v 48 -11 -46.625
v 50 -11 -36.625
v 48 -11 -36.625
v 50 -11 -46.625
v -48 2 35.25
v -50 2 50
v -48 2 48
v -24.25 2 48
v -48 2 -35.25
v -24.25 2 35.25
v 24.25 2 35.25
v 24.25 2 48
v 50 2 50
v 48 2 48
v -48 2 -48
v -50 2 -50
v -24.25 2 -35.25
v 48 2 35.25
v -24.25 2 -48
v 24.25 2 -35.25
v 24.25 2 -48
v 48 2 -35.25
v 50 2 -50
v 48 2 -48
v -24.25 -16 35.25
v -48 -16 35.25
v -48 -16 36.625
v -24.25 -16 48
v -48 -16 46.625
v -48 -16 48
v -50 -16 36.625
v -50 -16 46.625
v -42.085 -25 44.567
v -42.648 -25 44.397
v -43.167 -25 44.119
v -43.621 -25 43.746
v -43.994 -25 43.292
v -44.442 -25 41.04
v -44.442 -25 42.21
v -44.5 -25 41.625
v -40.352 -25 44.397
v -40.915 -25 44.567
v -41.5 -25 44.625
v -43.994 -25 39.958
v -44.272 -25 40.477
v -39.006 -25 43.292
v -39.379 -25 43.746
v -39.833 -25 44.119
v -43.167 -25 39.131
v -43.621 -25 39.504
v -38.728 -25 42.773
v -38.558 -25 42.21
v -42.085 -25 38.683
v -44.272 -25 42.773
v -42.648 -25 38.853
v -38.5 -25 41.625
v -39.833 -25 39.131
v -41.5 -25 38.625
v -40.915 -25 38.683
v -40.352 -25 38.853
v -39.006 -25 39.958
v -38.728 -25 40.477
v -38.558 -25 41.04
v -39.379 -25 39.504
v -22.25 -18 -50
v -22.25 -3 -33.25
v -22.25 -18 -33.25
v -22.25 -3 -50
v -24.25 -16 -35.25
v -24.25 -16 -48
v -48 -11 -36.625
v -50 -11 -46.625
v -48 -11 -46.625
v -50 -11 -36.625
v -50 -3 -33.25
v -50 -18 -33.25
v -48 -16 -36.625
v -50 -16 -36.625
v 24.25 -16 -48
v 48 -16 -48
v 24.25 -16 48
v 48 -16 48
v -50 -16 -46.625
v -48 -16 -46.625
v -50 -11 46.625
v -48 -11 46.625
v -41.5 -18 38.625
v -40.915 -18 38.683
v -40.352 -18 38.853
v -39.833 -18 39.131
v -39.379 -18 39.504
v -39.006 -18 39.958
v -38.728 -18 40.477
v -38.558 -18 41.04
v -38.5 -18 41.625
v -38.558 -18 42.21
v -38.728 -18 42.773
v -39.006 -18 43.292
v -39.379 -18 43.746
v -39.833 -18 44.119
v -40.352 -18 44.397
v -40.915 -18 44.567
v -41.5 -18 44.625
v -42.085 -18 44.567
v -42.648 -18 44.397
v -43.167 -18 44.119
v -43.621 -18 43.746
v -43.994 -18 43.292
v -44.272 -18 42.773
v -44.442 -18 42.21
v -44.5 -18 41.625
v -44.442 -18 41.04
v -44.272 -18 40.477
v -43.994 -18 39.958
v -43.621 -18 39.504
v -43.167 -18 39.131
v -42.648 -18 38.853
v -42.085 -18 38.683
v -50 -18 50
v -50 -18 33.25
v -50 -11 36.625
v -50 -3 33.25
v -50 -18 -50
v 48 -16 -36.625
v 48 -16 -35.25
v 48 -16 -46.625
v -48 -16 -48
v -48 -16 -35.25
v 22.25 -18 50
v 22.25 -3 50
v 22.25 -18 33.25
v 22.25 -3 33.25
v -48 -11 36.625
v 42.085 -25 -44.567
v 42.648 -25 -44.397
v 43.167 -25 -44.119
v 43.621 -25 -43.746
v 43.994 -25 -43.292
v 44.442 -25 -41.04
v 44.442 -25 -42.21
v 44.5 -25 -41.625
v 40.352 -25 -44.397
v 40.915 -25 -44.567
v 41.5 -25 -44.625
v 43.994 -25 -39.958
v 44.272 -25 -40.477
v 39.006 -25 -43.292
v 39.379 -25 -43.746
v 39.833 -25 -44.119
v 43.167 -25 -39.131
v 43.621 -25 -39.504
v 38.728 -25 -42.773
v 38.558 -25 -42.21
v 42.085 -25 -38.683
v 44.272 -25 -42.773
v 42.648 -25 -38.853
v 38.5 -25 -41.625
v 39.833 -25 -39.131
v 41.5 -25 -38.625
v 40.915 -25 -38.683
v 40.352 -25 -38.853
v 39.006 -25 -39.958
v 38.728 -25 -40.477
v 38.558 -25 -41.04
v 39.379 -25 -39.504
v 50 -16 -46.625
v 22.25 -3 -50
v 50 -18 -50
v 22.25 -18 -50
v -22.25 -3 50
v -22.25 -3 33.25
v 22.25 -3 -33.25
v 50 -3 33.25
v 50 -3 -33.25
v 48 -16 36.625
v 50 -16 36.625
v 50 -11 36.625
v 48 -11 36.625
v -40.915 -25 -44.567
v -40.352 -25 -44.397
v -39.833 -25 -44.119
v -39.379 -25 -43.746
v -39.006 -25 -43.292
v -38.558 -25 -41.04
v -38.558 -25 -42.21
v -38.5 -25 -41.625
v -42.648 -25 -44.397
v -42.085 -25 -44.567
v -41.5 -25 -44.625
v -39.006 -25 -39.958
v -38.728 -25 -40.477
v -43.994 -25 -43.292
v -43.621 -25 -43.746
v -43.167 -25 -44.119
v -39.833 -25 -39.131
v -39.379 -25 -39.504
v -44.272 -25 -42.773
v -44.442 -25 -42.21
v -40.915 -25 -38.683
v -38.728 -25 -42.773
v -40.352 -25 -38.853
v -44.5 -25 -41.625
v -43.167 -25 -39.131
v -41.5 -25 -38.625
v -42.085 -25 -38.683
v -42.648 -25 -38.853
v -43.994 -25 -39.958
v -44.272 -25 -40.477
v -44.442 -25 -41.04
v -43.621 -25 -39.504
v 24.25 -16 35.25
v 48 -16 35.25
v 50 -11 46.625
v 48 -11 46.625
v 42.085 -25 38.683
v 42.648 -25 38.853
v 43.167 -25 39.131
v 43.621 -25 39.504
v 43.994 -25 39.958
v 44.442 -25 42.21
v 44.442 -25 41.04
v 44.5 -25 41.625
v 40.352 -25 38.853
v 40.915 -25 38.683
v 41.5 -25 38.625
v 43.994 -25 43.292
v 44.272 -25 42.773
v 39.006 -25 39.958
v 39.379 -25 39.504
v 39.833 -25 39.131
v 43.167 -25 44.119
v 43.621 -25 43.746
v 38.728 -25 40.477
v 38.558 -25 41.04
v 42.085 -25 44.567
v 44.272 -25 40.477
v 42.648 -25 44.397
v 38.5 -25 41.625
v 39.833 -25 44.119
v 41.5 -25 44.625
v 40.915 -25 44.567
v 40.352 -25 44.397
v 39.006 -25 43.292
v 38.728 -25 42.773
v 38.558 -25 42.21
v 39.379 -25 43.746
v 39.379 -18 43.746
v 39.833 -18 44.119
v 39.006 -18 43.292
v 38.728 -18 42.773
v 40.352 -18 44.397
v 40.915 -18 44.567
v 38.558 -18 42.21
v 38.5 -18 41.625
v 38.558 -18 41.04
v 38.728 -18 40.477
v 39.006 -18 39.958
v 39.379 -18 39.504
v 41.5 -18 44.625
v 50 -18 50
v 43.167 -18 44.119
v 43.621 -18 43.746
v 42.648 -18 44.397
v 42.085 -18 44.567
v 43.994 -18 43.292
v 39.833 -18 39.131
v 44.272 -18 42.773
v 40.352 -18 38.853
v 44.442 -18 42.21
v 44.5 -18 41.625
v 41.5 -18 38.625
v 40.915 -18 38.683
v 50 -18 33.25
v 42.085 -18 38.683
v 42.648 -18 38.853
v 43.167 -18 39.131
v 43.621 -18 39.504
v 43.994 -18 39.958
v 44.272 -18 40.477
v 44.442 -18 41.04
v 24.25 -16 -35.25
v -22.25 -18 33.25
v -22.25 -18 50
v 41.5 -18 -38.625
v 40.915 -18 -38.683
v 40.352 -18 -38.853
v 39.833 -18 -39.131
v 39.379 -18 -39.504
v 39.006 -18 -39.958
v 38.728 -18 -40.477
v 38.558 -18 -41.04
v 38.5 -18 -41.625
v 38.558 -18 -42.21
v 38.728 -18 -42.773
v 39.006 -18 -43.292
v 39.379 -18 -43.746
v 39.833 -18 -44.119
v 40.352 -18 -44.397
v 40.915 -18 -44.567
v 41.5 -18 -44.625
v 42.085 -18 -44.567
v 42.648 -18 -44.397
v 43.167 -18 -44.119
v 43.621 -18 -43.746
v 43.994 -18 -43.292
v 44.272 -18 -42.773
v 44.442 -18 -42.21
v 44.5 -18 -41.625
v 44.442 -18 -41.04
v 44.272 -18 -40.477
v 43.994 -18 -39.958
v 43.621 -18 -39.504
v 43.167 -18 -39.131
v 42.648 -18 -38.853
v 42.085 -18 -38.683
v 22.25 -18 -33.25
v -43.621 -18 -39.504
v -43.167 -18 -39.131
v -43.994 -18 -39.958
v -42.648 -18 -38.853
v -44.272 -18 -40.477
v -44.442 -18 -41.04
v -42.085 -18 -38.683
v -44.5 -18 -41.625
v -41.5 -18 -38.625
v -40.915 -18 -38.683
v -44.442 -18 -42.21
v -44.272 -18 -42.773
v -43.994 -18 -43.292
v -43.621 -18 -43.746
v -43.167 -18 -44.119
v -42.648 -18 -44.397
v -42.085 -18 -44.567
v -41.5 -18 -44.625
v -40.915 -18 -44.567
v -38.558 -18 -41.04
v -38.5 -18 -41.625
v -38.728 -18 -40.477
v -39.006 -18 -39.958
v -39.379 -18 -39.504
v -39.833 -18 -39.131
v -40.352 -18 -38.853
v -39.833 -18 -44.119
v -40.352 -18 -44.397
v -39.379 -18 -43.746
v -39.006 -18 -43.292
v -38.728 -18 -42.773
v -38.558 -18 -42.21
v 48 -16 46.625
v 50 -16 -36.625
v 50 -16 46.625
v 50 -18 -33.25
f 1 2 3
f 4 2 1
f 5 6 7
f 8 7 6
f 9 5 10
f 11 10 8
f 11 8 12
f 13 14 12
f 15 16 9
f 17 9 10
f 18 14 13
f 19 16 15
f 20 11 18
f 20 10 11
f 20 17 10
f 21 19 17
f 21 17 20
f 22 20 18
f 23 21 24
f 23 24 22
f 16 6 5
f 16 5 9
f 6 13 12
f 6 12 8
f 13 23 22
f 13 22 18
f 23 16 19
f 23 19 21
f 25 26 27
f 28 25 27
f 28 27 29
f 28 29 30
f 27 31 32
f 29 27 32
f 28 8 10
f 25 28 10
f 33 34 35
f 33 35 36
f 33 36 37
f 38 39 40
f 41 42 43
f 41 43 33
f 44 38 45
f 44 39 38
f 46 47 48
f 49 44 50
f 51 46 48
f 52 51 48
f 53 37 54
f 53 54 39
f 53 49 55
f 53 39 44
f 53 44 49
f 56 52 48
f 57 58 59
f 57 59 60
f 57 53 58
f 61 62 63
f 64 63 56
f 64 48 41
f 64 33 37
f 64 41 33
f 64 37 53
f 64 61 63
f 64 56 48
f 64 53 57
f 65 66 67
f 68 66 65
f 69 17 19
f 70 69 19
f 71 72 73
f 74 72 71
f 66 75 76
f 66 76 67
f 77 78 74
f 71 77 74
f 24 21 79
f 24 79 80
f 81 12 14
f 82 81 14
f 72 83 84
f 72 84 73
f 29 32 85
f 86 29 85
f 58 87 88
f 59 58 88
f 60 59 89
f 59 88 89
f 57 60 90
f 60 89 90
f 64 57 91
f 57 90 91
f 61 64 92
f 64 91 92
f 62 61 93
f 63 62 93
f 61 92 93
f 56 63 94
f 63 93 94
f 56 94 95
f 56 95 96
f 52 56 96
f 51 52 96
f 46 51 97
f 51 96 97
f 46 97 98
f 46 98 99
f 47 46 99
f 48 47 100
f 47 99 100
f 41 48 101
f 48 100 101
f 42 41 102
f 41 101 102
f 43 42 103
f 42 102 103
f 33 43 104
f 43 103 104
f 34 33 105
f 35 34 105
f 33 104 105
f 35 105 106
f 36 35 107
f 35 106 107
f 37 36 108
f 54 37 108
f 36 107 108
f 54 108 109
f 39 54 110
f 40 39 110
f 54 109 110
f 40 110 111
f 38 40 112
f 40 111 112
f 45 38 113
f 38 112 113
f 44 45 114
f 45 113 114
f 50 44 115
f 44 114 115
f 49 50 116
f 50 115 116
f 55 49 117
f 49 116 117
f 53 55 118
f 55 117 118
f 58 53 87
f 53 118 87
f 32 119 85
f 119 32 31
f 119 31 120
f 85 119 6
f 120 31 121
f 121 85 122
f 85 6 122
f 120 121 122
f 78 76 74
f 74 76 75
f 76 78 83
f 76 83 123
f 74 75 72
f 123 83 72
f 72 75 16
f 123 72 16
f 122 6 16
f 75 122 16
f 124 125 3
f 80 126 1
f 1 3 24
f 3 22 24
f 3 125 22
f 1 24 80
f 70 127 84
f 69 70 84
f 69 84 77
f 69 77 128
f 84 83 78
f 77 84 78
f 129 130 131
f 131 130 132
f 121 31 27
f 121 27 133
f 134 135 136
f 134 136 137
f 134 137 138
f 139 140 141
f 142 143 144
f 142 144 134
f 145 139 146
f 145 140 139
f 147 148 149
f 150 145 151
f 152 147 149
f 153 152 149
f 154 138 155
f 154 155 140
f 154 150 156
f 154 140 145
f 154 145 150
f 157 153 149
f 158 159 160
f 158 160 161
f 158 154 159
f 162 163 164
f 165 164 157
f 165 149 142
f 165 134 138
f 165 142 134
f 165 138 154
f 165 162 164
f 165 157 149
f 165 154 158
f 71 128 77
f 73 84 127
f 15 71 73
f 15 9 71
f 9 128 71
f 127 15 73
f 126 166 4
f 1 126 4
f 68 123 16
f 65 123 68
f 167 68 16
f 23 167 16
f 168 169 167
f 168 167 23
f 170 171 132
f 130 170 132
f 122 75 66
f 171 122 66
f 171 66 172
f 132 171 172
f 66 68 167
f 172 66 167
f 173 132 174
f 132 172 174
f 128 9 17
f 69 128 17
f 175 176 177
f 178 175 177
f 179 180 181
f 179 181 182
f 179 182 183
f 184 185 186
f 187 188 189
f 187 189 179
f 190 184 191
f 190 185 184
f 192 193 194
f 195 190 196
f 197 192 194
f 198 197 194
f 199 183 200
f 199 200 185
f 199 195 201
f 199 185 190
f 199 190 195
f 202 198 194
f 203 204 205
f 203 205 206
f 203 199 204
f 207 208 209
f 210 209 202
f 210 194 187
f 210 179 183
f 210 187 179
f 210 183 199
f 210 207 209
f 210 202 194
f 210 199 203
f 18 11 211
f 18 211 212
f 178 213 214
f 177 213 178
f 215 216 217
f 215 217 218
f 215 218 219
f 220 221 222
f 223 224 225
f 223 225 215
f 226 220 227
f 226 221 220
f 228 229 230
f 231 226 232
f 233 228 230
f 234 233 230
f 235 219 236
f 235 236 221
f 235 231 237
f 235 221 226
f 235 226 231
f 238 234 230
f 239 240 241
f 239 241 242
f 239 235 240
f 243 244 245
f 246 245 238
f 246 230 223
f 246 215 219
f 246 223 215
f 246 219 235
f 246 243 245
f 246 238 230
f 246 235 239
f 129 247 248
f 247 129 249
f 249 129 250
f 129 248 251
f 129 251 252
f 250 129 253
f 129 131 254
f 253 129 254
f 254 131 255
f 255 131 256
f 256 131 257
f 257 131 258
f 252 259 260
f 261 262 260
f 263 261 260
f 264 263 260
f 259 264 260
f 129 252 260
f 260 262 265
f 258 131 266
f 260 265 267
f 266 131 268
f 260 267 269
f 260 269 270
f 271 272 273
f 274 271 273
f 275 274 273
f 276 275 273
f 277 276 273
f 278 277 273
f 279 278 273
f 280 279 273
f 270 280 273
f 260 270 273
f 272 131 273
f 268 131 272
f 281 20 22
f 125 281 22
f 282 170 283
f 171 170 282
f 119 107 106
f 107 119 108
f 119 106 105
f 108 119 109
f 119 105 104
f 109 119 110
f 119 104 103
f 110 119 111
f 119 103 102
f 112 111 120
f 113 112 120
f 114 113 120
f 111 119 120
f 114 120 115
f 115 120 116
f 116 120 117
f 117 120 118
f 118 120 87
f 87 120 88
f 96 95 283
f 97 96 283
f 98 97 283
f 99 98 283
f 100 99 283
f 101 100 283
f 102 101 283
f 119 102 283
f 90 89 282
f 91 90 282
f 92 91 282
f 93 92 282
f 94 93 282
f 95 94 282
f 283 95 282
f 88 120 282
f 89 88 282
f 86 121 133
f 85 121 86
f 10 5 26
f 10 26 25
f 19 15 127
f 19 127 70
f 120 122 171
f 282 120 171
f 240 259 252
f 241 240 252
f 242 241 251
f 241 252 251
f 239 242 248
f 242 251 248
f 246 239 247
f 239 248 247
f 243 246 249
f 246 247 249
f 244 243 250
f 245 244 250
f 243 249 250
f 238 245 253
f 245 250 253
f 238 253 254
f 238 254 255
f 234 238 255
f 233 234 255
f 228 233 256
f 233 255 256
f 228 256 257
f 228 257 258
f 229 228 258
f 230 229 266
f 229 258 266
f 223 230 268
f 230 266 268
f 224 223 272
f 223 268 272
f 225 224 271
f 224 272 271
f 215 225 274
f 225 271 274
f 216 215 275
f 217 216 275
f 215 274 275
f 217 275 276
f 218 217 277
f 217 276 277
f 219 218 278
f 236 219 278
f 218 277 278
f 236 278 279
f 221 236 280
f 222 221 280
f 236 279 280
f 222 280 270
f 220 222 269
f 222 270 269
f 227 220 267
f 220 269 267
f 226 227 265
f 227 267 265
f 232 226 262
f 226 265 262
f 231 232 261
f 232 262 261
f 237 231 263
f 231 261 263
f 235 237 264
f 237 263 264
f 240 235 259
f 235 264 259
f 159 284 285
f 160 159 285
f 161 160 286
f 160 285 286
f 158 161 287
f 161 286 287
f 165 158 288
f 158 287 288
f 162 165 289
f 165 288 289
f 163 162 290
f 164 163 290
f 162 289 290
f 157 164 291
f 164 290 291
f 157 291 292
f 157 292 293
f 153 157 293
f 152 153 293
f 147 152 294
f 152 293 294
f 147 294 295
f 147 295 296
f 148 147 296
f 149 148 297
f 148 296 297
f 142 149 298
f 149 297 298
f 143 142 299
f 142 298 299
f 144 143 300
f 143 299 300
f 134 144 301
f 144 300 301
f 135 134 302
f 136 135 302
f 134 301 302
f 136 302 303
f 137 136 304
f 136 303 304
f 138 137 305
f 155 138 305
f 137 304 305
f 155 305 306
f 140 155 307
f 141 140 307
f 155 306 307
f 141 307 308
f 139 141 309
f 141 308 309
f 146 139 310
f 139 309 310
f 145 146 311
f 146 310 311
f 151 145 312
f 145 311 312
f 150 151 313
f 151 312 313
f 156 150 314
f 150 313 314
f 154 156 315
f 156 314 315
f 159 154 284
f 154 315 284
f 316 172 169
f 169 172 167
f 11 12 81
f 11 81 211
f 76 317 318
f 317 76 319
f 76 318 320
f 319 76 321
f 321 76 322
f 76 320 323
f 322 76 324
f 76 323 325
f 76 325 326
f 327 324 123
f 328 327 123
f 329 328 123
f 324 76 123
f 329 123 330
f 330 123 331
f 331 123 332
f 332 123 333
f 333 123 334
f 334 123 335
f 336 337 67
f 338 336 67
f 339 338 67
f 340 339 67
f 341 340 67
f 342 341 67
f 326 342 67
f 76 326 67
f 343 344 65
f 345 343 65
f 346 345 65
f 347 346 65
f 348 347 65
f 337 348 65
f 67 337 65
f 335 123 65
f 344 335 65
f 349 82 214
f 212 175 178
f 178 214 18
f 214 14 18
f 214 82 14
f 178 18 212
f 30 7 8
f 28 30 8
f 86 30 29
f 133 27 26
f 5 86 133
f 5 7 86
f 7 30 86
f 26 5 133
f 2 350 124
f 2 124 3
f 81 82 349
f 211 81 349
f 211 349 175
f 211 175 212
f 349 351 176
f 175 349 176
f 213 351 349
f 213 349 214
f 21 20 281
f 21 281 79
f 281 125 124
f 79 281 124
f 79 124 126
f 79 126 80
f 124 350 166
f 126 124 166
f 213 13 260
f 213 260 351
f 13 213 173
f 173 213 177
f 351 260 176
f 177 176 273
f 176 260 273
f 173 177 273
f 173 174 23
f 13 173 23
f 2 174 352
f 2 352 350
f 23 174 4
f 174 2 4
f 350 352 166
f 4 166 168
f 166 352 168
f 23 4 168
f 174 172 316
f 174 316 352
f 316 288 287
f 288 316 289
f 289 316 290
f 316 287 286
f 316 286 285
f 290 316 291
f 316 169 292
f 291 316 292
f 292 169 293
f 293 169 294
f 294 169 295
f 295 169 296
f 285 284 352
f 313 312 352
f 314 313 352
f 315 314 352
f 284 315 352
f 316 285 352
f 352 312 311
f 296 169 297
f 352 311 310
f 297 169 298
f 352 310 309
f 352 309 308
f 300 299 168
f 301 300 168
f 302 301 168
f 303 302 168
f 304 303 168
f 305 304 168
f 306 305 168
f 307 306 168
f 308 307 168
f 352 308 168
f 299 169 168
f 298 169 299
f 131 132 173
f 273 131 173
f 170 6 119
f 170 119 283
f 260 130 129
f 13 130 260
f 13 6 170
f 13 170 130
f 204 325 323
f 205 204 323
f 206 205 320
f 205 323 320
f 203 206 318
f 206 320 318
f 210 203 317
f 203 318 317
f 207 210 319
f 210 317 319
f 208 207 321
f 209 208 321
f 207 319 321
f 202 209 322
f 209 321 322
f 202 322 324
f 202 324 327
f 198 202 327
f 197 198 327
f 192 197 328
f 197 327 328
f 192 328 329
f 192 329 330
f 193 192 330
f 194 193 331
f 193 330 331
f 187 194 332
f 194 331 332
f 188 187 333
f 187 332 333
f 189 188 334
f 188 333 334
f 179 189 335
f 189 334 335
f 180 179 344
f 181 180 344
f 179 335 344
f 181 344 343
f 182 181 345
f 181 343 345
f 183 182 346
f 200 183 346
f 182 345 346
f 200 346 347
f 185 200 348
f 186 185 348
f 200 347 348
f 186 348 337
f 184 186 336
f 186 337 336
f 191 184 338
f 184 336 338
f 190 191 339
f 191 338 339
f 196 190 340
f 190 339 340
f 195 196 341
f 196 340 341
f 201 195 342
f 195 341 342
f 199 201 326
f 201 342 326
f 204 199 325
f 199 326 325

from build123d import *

# Parameters (mm, degrees)
BOSS_EXTRUDE1_DEPTH      = 2
BOSS_EXTRUDE1_DEPTH_BACK = 3
SKETCH1_W                = 100
SKETCH1_H                = 100
SKETCH3_W                = 27.75
SKETCH3_H                = 16.75
BOSS_EXTRUDE4_DEPTH      = 18
SKETCH4_W                = 23.75
SKETCH4_H                = 12.75
CUT_EXTRUDE1_DEPTH       = 18
SKETCH5_R                = 3
BOSS_EXTRUDE5_DEPTH      = 7
SKETCH6_W                = 10
SKETCH6_H                = 5
CUT_EXTRUDE2_DEPTH       = 2
SKETCH7_W                = 10
SKETCH7_H                = 5
CUT_EXTRUDE3_DEPTH       = 2


with BuildPart() as part:
    # Sketch1 → Boss-Extrude1 (new, two sides: drawn at the far end of the back side and taken through both)
    with BuildSketch(Plane(origin=(0, 0, 0), x_dir=(1, 0, 0), z_dir=(0, 1, 0)).offset(-BOSS_EXTRUDE1_DEPTH_BACK)):
        Rectangle(SKETCH1_W, SKETCH1_H)
    extrude(amount=BOSS_EXTRUDE1_DEPTH + BOSS_EXTRUDE1_DEPTH_BACK)

    # Sketch3 → Boss-Extrude4 (add)
    with BuildSketch(Plane(origin=(0, 0, 0), x_dir=(1, 0, 0), z_dir=(0, 1, 0))):
        with Locations((-36.125, -41.625)):
            Rectangle(SKETCH3_W, SKETCH3_H)
        with Locations((36.125, -41.625)):
            Rectangle(SKETCH3_W, SKETCH3_H)
        with Locations((36.125, 41.625)):
            Rectangle(SKETCH3_W, SKETCH3_H)
        with Locations((-36.125, 41.625)):
            Rectangle(SKETCH3_W, SKETCH3_H)
    extrude(amount=-BOSS_EXTRUDE4_DEPTH)

    # Sketch4 → Cut-Extrude1 (cut)
    with BuildSketch(Plane(origin=(0, 2, 0), x_dir=(1, 0, 0), z_dir=(0, 1, 0))):
        with Locations((-36.125, -41.625)):
            Rectangle(SKETCH4_W, SKETCH4_H)
        with Locations((36.125, -41.625)):
            Rectangle(SKETCH4_W, SKETCH4_H)
        with Locations((36.125, 41.625)):
            Rectangle(SKETCH4_W, SKETCH4_H)
        with Locations((-36.125, 41.625)):
            Rectangle(SKETCH4_W, SKETCH4_H)
    extrude(amount=-CUT_EXTRUDE1_DEPTH, mode=Mode.SUBTRACT)

    # Sketch5 → Boss-Extrude5 (add)
    with BuildSketch(Plane(origin=(0, -18, 0), x_dir=(-1, 0, 0), z_dir=(0, -1, 0))):
        with Locations(Location((41.5, -41.625, 0), (0, 0, 90))):
            Circle(SKETCH5_R)
        with Locations(Location((-41.5, -41.625, 0), (0, 0, 270))):
            Circle(SKETCH5_R)
        with Locations(Location((41.5, 41.625, 0), (0, 0, 270))):
            Circle(SKETCH5_R)
        with Locations(Location((-41.5, 41.625, 0), (0, 0, 270))):
            Circle(SKETCH5_R)
    extrude(amount=BOSS_EXTRUDE5_DEPTH)

    # Sketch6 → Cut-Extrude2 (cut)
    with BuildSketch(Plane(origin=(50, 0, 0), x_dir=(0, 0, -1), z_dir=(1, 0, 0))):
        with Locations((-41.625, -13.5)):
            Rectangle(SKETCH6_W, SKETCH6_H)
        with Locations((41.625, -13.5)):
            Rectangle(SKETCH6_W, SKETCH6_H)
    extrude(amount=-CUT_EXTRUDE2_DEPTH, mode=Mode.SUBTRACT)

    # Sketch7 → Cut-Extrude3 (cut)
    with BuildSketch(Plane.ZY.offset(50)):
        with Locations((41.625, -13.5)):
            Rectangle(SKETCH7_W, SKETCH7_H)
        with Locations((-41.625, -13.5)):
            Rectangle(SKETCH7_W, SKETCH7_H)
    extrude(amount=-CUT_EXTRUDE3_DEPTH, mode=Mode.SUBTRACT)


solid = part.part
